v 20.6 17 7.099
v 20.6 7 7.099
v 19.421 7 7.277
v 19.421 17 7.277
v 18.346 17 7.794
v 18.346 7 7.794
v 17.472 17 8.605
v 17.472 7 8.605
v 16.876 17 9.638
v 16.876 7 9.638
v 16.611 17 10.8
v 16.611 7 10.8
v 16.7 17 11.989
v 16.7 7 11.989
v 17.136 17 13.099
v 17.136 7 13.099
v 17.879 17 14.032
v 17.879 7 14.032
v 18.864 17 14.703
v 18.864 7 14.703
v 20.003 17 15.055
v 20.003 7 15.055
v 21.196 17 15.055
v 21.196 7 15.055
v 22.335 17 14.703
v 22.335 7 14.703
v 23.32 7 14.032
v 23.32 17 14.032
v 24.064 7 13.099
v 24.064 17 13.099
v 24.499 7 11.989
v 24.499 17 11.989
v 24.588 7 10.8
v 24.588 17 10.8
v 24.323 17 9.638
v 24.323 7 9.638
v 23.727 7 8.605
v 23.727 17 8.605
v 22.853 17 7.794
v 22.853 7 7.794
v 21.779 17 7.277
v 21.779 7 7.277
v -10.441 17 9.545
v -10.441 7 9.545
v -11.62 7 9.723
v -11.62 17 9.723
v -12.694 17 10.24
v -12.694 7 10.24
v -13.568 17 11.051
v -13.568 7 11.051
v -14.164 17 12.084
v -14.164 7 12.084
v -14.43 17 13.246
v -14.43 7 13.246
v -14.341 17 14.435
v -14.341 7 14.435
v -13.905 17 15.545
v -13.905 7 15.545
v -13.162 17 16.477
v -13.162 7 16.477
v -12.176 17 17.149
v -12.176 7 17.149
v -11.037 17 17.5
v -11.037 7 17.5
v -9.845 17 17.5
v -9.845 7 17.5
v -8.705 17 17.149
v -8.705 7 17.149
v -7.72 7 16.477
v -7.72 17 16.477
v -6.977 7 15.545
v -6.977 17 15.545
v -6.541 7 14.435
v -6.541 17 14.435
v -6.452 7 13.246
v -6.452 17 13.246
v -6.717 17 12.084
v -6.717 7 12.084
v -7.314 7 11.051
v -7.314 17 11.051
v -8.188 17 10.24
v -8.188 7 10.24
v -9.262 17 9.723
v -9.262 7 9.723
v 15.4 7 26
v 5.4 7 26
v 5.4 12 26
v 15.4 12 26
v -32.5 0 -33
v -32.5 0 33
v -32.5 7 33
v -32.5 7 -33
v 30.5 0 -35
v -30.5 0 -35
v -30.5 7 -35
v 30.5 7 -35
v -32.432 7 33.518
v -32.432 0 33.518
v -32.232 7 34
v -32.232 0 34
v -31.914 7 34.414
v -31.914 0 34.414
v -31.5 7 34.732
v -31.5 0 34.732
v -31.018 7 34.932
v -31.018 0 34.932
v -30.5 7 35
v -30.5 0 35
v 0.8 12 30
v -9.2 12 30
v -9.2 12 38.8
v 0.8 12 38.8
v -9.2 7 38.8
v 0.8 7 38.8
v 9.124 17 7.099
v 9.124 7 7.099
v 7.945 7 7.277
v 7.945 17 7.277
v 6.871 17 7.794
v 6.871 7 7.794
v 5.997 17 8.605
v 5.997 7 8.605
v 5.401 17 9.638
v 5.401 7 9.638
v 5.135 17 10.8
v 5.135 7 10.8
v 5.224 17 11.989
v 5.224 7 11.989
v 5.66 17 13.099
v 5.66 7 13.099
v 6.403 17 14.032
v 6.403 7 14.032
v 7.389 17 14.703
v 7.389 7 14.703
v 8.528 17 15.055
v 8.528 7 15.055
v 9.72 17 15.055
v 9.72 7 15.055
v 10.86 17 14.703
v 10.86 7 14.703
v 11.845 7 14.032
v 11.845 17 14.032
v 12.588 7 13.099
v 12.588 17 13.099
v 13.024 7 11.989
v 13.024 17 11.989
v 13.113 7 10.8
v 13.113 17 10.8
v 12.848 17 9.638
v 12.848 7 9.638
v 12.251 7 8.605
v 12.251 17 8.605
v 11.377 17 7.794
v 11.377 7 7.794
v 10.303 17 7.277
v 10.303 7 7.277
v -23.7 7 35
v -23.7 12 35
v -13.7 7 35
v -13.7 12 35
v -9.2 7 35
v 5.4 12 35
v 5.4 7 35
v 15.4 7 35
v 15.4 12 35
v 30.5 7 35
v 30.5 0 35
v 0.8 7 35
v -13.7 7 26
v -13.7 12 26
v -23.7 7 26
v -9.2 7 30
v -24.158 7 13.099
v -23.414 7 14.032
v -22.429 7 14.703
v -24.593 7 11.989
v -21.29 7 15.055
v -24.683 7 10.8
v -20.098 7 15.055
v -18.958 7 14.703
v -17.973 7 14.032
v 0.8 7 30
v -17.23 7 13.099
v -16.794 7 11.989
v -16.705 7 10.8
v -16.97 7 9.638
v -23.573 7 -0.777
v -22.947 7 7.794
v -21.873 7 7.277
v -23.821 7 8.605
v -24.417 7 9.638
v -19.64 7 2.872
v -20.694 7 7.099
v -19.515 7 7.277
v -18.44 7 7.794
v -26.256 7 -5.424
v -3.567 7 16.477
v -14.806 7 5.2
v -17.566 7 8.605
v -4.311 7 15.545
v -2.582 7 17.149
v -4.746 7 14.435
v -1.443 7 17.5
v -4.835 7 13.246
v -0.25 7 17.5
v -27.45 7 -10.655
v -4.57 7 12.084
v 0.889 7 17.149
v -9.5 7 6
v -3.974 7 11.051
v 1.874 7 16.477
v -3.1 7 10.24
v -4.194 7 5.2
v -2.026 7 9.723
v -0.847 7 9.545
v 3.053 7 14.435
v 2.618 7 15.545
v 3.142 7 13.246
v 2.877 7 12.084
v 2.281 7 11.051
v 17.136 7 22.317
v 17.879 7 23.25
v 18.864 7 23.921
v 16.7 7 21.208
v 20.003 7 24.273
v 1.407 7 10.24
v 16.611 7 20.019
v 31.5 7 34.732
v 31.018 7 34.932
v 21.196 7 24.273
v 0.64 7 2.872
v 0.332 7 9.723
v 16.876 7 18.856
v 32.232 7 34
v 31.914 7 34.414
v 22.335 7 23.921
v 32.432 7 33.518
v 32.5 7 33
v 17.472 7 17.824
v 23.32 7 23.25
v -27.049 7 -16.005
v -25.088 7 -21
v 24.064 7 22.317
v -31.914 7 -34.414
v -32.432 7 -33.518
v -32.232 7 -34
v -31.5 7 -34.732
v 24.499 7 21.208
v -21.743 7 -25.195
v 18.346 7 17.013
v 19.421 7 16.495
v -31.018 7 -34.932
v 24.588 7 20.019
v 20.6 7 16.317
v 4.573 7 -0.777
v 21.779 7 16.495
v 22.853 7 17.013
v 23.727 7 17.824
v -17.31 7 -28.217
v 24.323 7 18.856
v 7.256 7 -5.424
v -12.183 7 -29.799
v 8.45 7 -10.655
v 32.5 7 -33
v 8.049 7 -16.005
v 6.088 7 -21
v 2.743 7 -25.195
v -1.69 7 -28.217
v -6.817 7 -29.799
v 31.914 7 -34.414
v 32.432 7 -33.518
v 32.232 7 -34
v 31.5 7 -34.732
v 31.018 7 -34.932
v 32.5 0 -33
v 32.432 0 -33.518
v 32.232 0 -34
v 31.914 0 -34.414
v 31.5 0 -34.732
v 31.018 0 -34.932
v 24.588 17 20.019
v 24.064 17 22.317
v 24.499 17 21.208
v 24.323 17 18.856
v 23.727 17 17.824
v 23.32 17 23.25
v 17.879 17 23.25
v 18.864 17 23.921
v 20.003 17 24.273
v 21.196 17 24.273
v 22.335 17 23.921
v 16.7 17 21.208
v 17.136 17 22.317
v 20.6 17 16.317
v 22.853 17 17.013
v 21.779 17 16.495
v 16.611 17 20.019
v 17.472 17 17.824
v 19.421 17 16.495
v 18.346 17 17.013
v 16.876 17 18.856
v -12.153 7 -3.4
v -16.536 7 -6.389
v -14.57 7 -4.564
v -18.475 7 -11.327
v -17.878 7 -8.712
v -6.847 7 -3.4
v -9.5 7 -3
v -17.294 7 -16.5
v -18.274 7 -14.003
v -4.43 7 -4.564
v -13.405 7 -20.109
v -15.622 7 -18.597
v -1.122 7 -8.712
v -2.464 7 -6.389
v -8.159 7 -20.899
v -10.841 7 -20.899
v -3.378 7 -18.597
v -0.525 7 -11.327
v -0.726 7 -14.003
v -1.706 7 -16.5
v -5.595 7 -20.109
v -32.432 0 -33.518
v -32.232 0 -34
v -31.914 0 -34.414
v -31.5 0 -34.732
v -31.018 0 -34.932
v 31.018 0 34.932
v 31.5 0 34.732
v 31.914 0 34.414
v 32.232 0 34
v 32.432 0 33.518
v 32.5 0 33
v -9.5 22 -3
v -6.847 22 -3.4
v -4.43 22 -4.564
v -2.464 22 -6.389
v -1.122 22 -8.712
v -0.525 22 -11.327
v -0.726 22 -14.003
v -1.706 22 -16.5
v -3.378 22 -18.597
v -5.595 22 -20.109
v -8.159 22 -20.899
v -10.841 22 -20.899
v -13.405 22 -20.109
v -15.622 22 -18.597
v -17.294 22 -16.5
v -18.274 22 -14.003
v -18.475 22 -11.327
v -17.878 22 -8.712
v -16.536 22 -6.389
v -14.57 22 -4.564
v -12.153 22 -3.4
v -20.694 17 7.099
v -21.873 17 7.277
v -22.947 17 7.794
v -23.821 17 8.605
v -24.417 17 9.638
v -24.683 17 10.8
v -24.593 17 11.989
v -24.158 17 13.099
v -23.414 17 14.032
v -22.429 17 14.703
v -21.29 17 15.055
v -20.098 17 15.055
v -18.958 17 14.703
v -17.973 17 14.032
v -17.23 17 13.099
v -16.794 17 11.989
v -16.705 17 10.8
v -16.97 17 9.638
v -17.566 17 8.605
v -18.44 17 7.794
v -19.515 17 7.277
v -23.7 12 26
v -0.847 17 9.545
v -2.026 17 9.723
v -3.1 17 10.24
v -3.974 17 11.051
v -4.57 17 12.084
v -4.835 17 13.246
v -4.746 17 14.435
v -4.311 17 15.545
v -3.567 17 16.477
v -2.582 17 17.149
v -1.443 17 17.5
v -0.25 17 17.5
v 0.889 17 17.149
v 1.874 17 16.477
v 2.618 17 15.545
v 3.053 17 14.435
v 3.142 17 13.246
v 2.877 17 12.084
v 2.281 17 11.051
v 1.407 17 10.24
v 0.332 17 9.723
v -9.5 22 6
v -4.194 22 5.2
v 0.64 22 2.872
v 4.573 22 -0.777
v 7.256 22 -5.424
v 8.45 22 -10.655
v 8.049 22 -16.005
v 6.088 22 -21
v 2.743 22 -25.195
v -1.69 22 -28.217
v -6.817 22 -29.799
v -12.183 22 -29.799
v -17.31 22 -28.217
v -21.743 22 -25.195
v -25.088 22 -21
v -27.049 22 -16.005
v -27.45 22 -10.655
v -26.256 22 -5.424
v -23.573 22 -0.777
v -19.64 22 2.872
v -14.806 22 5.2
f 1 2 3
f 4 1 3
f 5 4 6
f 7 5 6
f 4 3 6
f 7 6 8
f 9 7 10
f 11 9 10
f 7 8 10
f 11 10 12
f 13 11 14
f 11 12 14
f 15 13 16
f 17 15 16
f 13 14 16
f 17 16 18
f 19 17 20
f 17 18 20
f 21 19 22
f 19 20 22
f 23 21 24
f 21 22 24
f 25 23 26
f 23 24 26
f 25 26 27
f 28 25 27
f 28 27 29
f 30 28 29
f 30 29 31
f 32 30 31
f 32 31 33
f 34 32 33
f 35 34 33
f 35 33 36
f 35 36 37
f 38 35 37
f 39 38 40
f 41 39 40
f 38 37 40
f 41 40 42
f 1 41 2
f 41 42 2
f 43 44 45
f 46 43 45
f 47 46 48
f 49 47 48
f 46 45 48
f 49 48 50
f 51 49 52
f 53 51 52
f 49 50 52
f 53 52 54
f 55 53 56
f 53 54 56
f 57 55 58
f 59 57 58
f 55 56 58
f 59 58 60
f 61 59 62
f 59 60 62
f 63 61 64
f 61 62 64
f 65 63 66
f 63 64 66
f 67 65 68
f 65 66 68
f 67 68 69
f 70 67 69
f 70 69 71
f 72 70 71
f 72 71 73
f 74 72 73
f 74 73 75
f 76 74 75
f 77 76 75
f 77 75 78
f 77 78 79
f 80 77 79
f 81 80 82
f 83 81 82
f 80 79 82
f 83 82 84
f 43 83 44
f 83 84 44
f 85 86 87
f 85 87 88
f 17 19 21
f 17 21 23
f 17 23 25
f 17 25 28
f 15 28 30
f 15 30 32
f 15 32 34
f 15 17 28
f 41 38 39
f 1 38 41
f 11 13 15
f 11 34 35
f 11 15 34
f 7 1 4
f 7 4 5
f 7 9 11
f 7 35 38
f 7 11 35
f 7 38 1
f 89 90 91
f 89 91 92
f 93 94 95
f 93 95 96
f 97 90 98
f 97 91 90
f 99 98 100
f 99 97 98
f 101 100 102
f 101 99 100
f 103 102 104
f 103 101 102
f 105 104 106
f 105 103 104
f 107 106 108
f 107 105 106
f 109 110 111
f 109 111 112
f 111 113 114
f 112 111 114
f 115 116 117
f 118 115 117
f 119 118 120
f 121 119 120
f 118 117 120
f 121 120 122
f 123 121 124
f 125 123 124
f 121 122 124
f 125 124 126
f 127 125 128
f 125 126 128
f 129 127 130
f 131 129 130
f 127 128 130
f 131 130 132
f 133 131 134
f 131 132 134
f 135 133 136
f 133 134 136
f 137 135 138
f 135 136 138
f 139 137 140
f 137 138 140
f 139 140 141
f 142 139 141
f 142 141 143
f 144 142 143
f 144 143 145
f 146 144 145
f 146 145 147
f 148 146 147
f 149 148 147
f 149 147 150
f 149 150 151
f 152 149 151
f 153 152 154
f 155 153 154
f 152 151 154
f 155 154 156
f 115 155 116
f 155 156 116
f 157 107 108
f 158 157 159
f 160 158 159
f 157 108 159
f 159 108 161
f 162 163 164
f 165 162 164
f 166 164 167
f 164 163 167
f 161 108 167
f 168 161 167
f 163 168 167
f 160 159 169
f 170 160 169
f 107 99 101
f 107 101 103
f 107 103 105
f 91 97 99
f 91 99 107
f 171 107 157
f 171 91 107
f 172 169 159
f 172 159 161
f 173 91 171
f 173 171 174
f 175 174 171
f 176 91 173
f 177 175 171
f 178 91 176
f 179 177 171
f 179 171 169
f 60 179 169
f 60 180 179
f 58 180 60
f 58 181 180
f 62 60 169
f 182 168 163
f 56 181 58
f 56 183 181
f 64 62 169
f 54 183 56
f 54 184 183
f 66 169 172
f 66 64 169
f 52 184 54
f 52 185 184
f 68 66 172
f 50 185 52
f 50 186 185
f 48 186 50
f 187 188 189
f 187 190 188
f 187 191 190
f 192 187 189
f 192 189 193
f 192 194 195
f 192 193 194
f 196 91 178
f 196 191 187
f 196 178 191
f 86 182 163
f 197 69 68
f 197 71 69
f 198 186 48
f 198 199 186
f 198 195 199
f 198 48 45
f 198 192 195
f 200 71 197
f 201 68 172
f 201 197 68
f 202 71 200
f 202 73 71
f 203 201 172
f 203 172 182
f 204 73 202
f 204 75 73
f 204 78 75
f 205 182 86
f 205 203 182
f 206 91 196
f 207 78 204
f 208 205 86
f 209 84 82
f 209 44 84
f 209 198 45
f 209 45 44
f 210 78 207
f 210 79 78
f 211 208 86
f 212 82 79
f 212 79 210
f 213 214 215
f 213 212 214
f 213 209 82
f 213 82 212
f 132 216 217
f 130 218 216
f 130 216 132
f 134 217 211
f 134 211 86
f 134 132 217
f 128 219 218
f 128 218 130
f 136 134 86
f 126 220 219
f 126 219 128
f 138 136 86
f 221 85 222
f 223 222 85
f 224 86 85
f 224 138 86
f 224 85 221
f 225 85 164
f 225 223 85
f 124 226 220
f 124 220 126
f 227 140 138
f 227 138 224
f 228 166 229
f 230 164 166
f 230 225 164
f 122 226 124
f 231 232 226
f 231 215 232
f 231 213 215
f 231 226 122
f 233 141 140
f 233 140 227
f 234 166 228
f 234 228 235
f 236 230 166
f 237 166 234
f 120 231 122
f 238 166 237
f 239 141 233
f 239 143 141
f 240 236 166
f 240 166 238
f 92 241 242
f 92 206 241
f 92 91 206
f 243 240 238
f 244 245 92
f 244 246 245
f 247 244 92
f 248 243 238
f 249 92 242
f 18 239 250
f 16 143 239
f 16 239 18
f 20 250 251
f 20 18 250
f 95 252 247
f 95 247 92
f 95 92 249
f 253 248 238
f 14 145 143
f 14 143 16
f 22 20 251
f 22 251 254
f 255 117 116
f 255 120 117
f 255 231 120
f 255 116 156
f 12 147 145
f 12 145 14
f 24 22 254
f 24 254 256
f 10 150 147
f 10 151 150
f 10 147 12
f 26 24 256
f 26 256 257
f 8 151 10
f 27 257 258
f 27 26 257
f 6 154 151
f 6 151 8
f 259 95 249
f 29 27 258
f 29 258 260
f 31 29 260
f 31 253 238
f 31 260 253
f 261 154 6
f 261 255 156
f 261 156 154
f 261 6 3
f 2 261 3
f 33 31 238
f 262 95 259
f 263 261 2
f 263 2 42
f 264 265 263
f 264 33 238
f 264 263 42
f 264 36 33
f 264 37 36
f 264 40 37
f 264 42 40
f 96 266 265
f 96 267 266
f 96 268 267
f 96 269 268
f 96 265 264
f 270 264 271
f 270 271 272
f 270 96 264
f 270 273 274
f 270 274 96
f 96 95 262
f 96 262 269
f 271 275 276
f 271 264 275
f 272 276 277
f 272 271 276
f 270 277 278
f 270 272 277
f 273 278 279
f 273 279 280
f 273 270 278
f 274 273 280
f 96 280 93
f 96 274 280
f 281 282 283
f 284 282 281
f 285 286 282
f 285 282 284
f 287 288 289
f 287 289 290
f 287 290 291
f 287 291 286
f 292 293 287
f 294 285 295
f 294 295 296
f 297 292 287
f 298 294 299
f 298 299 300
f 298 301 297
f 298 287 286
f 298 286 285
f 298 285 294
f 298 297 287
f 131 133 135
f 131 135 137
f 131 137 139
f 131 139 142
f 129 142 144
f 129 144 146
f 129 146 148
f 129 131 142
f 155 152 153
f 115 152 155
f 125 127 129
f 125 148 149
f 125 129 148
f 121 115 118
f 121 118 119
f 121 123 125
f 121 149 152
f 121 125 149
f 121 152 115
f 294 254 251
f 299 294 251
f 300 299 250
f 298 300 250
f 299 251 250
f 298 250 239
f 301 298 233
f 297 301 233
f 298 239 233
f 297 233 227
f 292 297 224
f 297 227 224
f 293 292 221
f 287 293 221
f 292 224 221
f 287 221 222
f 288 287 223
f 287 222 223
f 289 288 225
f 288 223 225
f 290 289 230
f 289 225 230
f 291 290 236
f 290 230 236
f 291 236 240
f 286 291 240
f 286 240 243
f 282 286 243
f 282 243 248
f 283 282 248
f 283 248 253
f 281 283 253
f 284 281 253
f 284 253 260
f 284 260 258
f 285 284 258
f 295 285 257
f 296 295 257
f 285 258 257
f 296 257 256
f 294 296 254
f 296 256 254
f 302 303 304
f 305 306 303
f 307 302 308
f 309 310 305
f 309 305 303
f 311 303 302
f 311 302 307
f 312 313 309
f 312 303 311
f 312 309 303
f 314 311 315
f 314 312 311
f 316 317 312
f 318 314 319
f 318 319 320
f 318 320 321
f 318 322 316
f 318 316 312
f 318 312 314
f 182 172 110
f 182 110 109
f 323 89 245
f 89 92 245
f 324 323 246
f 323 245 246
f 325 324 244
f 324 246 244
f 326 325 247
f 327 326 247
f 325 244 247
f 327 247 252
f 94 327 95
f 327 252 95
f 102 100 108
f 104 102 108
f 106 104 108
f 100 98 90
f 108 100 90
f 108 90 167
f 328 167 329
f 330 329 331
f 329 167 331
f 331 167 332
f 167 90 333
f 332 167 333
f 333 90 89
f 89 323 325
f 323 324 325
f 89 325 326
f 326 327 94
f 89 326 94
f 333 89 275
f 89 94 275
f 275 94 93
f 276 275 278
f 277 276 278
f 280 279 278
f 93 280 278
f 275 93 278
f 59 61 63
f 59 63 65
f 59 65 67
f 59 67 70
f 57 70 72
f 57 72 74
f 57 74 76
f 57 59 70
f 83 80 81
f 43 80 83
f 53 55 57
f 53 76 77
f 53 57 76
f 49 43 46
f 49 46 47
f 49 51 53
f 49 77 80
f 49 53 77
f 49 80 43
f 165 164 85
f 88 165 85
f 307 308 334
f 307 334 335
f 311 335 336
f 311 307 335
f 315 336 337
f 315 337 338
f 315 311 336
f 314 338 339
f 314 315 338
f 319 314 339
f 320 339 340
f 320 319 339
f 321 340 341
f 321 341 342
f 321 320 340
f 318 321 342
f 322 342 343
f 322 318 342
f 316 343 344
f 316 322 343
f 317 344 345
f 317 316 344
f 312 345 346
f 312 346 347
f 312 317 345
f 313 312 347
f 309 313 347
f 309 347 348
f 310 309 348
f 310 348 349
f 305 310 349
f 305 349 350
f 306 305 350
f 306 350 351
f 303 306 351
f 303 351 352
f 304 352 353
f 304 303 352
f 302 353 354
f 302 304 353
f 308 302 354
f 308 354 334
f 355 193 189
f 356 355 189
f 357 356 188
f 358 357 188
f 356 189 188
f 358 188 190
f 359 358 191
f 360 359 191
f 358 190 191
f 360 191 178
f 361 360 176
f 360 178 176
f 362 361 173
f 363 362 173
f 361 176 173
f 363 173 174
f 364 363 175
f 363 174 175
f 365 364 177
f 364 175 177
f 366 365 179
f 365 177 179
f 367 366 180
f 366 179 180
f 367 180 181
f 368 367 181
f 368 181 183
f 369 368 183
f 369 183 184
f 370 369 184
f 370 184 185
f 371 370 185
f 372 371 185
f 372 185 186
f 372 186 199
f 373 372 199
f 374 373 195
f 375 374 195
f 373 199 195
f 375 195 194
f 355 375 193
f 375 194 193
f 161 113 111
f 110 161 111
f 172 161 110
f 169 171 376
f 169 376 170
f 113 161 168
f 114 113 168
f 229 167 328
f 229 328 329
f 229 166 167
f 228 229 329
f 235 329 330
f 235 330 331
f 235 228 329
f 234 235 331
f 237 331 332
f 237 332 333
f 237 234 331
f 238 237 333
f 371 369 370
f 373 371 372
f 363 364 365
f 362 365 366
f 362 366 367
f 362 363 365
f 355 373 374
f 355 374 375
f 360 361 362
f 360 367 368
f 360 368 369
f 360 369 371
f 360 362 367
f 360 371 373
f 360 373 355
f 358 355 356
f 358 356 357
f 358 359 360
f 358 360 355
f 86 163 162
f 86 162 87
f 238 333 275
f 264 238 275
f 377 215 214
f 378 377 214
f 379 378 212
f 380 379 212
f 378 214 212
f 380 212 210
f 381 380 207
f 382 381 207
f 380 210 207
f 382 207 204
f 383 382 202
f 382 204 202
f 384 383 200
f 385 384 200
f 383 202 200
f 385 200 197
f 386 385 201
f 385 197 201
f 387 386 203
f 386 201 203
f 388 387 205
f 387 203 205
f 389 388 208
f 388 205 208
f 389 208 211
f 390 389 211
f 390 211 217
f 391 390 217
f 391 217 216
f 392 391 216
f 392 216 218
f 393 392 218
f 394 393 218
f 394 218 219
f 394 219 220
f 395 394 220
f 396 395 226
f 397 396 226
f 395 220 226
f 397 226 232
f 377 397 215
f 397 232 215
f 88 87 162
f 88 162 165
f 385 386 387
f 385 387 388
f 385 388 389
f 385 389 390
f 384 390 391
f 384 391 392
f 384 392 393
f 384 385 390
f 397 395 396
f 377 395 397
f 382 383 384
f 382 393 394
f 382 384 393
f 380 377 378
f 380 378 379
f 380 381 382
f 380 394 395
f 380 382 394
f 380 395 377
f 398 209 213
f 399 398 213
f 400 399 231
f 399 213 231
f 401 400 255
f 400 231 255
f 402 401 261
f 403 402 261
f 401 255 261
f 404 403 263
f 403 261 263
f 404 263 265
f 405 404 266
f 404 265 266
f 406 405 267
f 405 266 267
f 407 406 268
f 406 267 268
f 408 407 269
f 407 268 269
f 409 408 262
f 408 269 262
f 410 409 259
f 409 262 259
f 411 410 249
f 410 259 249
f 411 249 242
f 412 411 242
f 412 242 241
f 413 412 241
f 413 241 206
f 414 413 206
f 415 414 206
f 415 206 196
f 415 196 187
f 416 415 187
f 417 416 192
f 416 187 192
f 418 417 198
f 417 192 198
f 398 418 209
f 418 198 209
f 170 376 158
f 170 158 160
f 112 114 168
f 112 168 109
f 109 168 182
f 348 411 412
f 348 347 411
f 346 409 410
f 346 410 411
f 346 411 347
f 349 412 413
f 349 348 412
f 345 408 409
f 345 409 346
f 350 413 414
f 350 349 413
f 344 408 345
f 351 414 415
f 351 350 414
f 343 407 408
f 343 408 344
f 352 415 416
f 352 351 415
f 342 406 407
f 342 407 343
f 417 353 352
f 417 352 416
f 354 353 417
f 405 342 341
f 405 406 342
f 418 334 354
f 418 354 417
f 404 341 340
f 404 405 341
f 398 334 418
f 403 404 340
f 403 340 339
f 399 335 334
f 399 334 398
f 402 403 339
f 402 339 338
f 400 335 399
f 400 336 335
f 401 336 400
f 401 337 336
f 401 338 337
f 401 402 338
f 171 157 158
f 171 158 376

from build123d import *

# Parameters (mm, degrees)
SKETCH_1_W      = 65
SKETCH_1_H      = 70
EXTRUDE_1_DEPTH = 7
FILLET_1_R      = 2
SKETCH_3_R      = 18
SKETCH_3_R_2    = 9
EXTRUDE_2_DEPTH = 15
SKETCH_4_R      = 4
EXTRUDE_3_DEPTH = 10
SKETCH_5_W      = 10
SKETCH_5_H      = 9
SKETCH_5_H_2    = 8.8
EXTRUDE_4_DEPTH = 5


with BuildPart() as part:
    # 草图1 → 凸台-拉伸1 (new body)
    with BuildSketch(Plane(origin=(0, 0, 0), x_dir=(1, 0, 0), z_dir=(0, 1, 0))):
        Rectangle(SKETCH_1_W, SKETCH_1_H)
    extrude(amount=EXTRUDE_1_DEPTH)

    # 圆角1
    fillet_1_edges = [part.edges().sort_by_distance(p)[0] for p in [
        (32.5, 3.5, 35),
        (-32.5, 3.5, 35),
        (-32.5, 3.5, -35),
        (32.5, 3.5, -35),
    ]]
    fillet(fillet_1_edges, radius=FILLET_1_R)

    # 草图3 → 凸台-拉伸2 (add)
    with BuildSketch(Plane(origin=(0, 7, 0), x_dir=(1, 0, 0), z_dir=(0, 1, 0))):
        with Locations(Location((-9.5, 12, 0), (0, 0, 270))):
            Circle(SKETCH_3_R)
        with Locations(Location((-9.5, 12, 0), (0, 0, 270))):
            Circle(SKETCH_3_R_2, mode=Mode.SUBTRACT)
    extrude(amount=EXTRUDE_2_DEPTH)

    # 草图4 → 凸台-拉伸3 (add)
    with BuildSketch(Plane(origin=(0, 7, 0), x_dir=(1, 0, 0), z_dir=(0, 1, 0))):
        with Locations(Location((-20.693709583, -11.099353322, 0), (0, 0, 90))):
            Circle(SKETCH_4_R)
        with Locations(Location((-10.440917108, -13.544973545, 0), (0, 0, 90))):
            Circle(SKETCH_4_R)
        with Locations(Location((9.12404468, -11.099353322, 0), (0, 0, 90))):
            Circle(SKETCH_4_R)
        with Locations(Location((20.599647266, -20.317460317, 0), (0, 0, 90))):
            Circle(SKETCH_4_R)
        with Locations(Location((-0.846560847, -13.544973545, 0), (0, 0, 90))):
            Circle(SKETCH_4_R)
        with Locations(Location((20.599647266, -11.099353322, 0), (0, 0, 90))):
            Circle(SKETCH_4_R)
    extrude(amount=EXTRUDE_3_DEPTH)

    # 草图5 → 凸台-拉伸4 (add)
    with BuildSketch(Plane(origin=(0, 7, 0), x_dir=(1, 0, 0), z_dir=(0, 1, 0))):
        with Locations((-18.7, -30.5)):
            Rectangle(SKETCH_5_W, SKETCH_5_H)
        with Locations((-4.2, -34.4)):
            Rectangle(SKETCH_5_W, SKETCH_5_H_2)
        with Locations((10.4, -30.5)):
            Rectangle(SKETCH_5_W, SKETCH_5_H)
    extrude(amount=EXTRUDE_4_DEPTH)


solid = part.part
